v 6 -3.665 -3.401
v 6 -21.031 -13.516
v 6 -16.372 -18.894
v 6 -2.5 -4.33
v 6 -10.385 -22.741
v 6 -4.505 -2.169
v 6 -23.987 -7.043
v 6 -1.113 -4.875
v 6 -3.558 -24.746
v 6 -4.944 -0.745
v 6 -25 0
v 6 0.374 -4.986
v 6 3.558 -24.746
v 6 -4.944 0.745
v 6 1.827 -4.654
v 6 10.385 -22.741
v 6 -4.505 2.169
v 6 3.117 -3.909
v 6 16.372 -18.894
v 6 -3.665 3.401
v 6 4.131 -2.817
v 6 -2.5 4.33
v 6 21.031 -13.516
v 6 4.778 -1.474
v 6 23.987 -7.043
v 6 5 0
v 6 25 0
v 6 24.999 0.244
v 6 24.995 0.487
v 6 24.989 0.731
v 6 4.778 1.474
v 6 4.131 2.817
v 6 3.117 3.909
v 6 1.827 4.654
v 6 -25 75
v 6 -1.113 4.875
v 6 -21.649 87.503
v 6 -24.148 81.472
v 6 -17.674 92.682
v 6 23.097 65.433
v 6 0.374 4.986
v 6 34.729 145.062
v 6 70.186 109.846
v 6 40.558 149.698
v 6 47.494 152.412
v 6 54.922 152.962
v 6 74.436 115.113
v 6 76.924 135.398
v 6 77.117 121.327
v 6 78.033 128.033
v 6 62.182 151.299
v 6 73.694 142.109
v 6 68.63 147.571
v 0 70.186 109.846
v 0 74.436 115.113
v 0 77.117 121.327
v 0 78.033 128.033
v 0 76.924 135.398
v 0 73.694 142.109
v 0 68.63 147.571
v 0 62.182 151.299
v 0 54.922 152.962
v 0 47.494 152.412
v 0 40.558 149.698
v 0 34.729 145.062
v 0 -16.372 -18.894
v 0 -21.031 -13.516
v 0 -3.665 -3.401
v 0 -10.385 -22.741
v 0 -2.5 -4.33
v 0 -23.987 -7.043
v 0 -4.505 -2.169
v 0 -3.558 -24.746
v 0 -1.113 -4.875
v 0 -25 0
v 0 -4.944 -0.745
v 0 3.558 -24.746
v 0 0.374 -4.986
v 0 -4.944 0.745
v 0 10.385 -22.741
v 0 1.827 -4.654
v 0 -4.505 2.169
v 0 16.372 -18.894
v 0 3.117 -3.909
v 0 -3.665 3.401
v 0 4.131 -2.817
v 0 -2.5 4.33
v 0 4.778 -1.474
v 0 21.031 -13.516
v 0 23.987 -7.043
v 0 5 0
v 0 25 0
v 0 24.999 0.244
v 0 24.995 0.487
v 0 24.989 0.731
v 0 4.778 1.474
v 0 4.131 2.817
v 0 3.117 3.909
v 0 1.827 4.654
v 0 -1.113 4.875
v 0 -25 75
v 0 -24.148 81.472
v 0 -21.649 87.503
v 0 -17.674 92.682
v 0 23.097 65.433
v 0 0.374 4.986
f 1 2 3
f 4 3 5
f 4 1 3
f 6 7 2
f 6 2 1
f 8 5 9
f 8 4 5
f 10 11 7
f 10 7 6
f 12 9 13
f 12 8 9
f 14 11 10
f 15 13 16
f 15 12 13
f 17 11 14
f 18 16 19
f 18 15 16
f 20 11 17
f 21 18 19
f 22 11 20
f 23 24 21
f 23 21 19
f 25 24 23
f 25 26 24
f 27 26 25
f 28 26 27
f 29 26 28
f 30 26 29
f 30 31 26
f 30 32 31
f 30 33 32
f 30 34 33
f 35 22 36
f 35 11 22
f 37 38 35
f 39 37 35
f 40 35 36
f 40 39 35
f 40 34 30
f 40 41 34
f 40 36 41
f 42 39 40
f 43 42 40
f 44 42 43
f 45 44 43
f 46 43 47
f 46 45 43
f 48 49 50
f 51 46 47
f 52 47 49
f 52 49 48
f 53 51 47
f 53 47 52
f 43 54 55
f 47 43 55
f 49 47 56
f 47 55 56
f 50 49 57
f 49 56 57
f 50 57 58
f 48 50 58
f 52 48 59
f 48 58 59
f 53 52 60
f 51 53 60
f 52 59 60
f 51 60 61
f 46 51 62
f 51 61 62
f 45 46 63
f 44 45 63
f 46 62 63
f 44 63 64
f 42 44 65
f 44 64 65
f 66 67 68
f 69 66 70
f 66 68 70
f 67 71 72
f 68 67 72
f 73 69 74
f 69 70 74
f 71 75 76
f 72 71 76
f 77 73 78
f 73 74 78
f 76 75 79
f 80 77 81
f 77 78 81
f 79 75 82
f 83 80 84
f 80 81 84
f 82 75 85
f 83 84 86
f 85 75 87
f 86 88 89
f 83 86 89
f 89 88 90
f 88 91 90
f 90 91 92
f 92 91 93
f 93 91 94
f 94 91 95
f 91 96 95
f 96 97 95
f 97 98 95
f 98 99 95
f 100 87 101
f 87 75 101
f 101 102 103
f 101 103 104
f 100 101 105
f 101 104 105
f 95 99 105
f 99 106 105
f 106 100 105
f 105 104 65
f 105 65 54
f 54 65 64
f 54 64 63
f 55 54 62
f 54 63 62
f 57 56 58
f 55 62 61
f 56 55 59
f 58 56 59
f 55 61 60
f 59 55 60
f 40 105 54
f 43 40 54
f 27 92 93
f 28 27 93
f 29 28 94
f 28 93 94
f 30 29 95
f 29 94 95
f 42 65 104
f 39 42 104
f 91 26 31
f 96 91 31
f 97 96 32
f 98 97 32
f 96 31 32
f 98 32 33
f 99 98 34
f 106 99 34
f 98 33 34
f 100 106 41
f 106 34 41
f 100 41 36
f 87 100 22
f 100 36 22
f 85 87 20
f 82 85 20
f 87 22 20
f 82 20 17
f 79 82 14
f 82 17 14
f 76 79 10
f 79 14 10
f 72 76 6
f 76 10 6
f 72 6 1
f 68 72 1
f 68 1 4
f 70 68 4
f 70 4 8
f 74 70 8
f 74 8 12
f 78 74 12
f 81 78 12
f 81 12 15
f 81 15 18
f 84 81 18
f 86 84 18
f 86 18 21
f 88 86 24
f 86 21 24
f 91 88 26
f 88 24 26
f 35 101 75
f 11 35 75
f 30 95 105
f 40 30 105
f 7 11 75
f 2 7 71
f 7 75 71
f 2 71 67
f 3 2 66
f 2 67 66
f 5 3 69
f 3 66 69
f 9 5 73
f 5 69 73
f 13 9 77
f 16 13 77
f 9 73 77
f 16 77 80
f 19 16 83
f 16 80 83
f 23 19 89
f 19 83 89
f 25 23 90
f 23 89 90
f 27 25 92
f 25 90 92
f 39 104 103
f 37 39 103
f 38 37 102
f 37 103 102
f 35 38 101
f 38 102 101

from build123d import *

# Parameters (mm, degrees)
F1_DEPTH = 6
F2_R     = 5
F3_DEPTH = 6


with BuildPart() as f1:
    # F0 (on Right) → F1 (new body)
    with BuildSketch(Plane.YZ):
        with BuildLine():
            ThreePointArc((-25, 0), (0, -25), (25, 0))
            ThreePointArc((25, 0), (24.997328528, 0.3654674576), (24.989314683, 0.7308568083))
            ThreePointArc((24.989314683, 0.7308568083), (17.4173559961, 17.9342050313), (0, 25))
            ThreePointArc((0, 25), (-17.6776695297, 17.6776695297), (-25, 0))
        make_face()
        with BuildLine():
            ThreePointArc((0, 25), (17.4173559961, 17.9342050313), (24.989314683, 0.7308568083))
            Line((24.989314683, 0.7308568083), (23.0969883128, 65.4329141909))
            ThreePointArc((23.0969883128, 65.4329141909), (13.8892558255, 54.2132596924), (0, 50))
            Line((0, 50), (0, 25))
        make_face()
        with BuildLine():
            Line((-25, 75), (-25, 0))
            ThreePointArc((-25, 0), (-17.6776695297, 17.6776695297), (0, 25))
            Line((0, 25), (0, 50))
            ThreePointArc((0, 50), (-17.6776695297, 57.3223304703), (-25, 75))
        make_face()
        with BuildLine():
            Line((0, 75), (23.0969883128, 65.4329141909))
            ThreePointArc((23.0969883128, 65.4329141909), (24.5196320101, 70.1227419496), (25, 75))
            ThreePointArc((25, 75), (23.0969883128, 84.5670858091), (17.6776695297, 92.6776695297))
            Line((17.6776695297, 92.6776695297), (0, 75))
        make_face()
        with BuildLine():
            ThreePointArc((0, 50), (13.8892558255, 54.2132596924), (23.0969883128, 65.4329141909))
            Line((23.0969883128, 65.4329141909), (0, 75))
            Line((0, 75), (0, 50))
        make_face()
        with BuildLine():
            ThreePointArc((25, 75), (24.5196320101, 70.1227419496), (23.0969883128, 65.4329141909))
            Line((23.0969883128, 65.4329141909), (70.1863286533, 109.8461009142))
            ThreePointArc((70.1863286533, 109.8461009142), (52.6675411314, 103.035680061), (35.3553390593, 110.3553390593))
            Line((35.3553390593, 110.3553390593), (17.6776695297, 92.6776695297))
            ThreePointArc((17.6776695297, 92.6776695297), (23.0969883128, 84.5670858091), (25, 75))
        make_face()
        with BuildLine():
            ThreePointArc((-17.6737877377, 92.6815504694), (-23.0959378836, 84.569621376), (-25, 75))
            ThreePointArc((-25, 75), (-17.6776695297, 57.3223304703), (0, 50))
            Line((0, 50), (0, 75))
            Line((0, 75), (17.6776695297, 92.6776695297))
            ThreePointArc((17.6776695297, 92.6776695297), (0.0027445402, 99.9999998493), (-17.6737877377, 92.6815504694))
        make_face()
        with BuildLine():
            ThreePointArc((35.3553390593, 110.3553390593), (52.6675411314, 103.035680061), (70.1863286533, 109.8461009142))
            ThreePointArc((70.1863286533, 109.8461009142), (75.9876704424, 118.1292972041), (78.033008589, 128.033008589))
            ThreePointArc((78.033008589, 128.033008589), (62.1819121392, 151.298811043), (34.7292034826, 145.0615352026))
            ThreePointArc((34.7292034826, 145.0615352026), (28.0370760813, 127.5820561841), (35.3553390593, 110.3553390593))
        make_face()
        with BuildLine():
            Line((34.7292034826, 145.0615352026), (-17.6737877377, 92.6815504694))
            ThreePointArc((-17.6737877377, 92.6815504694), (0.0027445402, 99.9999998493), (17.6776695297, 92.6776695297))
            Line((17.6776695297, 92.6776695297), (35.3553390593, 110.3553390593))
            ThreePointArc((35.3553390593, 110.3553390593), (28.0370760813, 127.5820561841), (34.7292034826, 145.0615352026))
        make_face()
    extrude(amount=F1_DEPTH)

    # F2 (on face) → F3 (cut)
    with BuildSketch(Plane.YZ.offset(6)):
        Circle(F2_R)
    extrude(amount=-F3_DEPTH, mode=Mode.SUBTRACT)


solid = f1.part
